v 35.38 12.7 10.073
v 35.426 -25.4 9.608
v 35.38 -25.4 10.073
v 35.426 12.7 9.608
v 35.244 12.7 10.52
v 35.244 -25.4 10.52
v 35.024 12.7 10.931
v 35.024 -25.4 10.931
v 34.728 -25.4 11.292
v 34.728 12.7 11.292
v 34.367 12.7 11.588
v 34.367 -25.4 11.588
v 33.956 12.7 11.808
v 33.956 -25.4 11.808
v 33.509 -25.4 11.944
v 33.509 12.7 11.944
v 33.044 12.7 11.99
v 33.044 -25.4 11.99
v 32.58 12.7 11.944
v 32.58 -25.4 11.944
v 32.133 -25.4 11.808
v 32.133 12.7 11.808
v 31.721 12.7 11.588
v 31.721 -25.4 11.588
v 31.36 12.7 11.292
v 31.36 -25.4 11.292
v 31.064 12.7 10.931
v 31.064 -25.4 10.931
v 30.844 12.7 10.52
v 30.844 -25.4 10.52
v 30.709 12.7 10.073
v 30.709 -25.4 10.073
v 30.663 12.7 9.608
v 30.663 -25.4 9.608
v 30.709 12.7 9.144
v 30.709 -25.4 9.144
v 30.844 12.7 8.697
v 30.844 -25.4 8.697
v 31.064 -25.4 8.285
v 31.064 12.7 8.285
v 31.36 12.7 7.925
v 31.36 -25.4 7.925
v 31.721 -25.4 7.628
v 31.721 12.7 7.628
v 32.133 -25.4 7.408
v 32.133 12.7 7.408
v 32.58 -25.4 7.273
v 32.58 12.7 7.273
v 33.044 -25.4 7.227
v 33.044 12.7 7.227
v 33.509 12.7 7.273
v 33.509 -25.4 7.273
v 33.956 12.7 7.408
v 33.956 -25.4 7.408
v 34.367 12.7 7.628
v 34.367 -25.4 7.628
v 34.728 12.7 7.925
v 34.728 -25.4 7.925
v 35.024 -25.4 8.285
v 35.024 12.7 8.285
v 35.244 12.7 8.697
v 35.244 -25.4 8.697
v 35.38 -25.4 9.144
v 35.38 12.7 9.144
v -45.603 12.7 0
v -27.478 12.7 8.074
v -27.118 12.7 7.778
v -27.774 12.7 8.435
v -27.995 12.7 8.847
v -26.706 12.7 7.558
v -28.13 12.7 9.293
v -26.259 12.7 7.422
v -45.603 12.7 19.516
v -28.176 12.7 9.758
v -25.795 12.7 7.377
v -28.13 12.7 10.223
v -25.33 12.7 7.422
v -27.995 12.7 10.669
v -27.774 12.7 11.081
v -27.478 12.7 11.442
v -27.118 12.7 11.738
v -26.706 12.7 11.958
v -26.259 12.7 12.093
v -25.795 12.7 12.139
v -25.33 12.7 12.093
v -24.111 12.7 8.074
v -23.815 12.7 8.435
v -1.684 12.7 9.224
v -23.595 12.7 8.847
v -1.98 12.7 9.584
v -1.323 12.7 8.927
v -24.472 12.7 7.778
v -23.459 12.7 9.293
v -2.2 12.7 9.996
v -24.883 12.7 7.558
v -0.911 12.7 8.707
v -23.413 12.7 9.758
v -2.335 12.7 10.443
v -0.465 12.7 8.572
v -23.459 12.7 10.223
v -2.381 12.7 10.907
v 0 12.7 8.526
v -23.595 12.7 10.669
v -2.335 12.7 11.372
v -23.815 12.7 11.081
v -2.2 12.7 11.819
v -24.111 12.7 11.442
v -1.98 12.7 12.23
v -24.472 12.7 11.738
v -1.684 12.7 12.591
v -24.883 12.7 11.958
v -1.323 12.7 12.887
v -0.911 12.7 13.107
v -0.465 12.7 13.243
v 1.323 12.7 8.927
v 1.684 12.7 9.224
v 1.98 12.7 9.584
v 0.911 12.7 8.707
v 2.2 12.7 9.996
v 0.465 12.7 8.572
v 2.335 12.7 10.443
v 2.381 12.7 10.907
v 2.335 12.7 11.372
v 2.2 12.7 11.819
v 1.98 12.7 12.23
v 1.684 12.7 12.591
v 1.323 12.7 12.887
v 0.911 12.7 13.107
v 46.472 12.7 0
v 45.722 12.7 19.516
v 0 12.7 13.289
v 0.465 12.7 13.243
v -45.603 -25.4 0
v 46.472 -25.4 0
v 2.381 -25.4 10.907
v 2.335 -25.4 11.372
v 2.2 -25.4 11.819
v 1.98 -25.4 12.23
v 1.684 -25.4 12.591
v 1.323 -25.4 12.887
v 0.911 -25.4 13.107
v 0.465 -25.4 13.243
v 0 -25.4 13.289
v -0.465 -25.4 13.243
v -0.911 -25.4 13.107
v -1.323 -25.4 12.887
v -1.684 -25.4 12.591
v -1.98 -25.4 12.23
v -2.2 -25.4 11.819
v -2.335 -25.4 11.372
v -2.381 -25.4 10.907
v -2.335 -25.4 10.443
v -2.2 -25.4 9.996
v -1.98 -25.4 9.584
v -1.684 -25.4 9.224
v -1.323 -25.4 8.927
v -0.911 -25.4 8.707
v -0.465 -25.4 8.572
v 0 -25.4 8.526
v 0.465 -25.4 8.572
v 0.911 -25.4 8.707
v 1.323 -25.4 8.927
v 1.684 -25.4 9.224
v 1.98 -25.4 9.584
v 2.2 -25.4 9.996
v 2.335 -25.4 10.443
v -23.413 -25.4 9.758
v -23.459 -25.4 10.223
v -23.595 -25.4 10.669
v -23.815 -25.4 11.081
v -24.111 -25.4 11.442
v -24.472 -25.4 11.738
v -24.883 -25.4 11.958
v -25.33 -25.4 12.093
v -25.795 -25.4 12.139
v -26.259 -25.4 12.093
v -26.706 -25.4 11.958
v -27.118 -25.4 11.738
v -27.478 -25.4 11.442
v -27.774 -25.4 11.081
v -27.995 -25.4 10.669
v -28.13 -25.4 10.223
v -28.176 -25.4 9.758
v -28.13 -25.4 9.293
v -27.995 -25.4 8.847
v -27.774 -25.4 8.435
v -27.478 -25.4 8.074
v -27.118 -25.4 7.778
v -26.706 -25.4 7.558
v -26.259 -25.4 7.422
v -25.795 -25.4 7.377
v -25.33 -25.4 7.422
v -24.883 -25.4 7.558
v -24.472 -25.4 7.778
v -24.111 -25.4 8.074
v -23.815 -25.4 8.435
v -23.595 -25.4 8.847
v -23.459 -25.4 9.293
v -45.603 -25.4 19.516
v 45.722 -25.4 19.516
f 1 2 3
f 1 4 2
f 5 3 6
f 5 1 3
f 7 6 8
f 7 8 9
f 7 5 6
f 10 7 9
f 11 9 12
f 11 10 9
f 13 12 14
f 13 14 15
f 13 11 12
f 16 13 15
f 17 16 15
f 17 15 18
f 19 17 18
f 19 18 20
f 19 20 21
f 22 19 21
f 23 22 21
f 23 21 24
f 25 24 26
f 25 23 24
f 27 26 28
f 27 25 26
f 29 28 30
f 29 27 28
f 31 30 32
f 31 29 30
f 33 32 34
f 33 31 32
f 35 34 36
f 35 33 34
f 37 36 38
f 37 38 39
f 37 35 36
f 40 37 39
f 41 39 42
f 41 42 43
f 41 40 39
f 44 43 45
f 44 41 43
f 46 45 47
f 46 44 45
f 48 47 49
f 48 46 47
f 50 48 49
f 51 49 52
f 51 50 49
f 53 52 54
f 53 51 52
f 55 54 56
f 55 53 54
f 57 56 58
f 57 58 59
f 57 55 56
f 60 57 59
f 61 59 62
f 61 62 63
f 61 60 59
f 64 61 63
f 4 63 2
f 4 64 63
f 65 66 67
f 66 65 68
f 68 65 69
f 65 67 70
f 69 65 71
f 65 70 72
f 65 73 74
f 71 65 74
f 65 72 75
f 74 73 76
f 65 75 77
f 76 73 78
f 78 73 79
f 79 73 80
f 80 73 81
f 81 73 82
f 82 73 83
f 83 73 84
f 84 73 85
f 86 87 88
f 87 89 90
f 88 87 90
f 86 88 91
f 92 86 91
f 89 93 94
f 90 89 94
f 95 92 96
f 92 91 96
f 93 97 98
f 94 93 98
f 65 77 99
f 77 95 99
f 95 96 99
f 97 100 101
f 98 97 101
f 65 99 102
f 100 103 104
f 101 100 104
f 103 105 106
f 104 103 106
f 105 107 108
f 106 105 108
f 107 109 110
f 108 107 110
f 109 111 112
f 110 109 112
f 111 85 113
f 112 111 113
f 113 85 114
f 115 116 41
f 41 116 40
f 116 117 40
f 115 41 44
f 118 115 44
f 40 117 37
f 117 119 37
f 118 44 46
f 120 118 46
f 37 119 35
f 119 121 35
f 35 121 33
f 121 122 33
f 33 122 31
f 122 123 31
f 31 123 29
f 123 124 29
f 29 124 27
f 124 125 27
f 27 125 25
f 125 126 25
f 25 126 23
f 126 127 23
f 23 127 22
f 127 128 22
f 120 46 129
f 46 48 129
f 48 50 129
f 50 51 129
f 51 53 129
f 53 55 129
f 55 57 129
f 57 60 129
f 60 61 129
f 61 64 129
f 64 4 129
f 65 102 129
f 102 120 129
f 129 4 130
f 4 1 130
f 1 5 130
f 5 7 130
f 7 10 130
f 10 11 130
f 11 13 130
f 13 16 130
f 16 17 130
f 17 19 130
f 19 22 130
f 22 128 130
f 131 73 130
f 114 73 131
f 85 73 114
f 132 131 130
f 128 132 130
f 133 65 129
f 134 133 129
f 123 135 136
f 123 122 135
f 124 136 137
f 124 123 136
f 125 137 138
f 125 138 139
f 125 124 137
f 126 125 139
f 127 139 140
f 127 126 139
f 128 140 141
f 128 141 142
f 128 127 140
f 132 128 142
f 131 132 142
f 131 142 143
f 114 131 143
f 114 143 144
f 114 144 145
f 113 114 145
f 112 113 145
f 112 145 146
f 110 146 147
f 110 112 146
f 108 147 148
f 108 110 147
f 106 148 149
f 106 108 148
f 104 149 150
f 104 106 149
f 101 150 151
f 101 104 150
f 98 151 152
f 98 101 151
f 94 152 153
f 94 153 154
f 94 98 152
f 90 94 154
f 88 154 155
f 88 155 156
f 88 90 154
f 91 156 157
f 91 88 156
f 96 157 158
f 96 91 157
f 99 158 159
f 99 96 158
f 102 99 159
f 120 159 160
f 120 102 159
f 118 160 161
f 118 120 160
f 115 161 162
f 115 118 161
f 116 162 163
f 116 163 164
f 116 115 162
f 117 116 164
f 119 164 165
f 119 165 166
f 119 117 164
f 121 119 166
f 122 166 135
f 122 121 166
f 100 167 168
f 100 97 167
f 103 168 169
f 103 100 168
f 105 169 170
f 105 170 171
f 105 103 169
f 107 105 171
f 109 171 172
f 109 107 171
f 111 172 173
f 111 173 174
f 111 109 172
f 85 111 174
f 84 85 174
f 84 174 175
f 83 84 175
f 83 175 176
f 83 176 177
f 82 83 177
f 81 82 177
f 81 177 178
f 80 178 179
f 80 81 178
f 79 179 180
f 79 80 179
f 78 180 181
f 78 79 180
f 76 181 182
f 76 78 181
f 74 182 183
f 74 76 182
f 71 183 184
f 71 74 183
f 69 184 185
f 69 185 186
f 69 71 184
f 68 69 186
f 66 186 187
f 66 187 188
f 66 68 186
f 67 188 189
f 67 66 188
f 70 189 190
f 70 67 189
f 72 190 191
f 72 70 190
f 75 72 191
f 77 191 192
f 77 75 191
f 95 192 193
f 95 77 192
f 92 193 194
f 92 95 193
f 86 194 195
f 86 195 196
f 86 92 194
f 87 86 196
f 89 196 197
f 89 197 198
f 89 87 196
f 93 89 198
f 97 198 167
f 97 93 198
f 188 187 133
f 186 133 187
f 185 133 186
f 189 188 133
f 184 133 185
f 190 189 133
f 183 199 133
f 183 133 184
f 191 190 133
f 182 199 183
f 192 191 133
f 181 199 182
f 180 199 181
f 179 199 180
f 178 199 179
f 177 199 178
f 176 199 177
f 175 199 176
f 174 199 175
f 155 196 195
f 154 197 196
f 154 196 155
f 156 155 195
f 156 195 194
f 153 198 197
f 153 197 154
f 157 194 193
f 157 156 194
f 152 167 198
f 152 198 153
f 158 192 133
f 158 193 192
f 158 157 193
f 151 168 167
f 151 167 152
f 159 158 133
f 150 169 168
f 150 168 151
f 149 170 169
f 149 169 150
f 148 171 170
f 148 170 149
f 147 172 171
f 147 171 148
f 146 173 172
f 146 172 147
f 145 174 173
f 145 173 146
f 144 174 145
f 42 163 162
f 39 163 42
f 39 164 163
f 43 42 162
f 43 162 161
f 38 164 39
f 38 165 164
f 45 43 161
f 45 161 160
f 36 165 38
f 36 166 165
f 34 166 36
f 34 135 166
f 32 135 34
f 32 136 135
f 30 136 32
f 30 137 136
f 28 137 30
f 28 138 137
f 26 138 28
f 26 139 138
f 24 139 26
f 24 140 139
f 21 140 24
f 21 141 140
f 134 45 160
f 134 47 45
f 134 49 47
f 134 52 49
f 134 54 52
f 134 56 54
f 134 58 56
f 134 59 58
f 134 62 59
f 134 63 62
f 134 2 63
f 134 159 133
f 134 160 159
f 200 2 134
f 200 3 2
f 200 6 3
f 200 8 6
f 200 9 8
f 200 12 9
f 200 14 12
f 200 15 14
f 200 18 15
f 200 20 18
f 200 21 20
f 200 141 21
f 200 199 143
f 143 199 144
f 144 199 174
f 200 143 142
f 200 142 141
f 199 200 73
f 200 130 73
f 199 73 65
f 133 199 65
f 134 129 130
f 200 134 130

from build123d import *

# Parameters (mm, degrees)
F0_R     = 2.38125
F1_DEPTH = 12.7
F2_DEPTH = 25.4
F3_DEPTH = 25.4
F4_DEPTH = 25.4


# Not quite as in the source:
# - a feature names something its author has since deleted; it is built from what else it names


with BuildPart() as f1:
    # F0 (on Front) → F1 (new body, symmetric)
    with BuildSketch(Plane.XZ):
        Polygon((-45.6028679988, 0), (46.4721320012, 0), (45.7215224688, 19.5158975394), (-45.6028679988, 19.5158975394), align=None)
        with Locations((33.0442860723, 9.6084093675)):
            Circle(F0_R, mode=Mode.SUBTRACT)
        with Locations((-25.7945582271, 9.7579487697)):
            Circle(F0_R, mode=Mode.SUBTRACT)
        with Locations((0, 10.9073175117)):
            Circle(F0_R, mode=Mode.SUBTRACT)
    extrude(amount=F1_DEPTH, both=True)

    # F0 (on Front) → F2 (join)
    with BuildSketch(Plane.XZ):
        Polygon((-45.6028679988, 0), (46.4721320012, 0), (45.7215224688, 19.5158975394), (-45.6028679988, 19.5158975394), align=None)
        with Locations((33.0442860723, 9.6084093675)):
            Circle(F0_R, mode=Mode.SUBTRACT)
        with Locations((-25.7945582271, 9.7579487697)):
            Circle(F0_R, mode=Mode.SUBTRACT)
        with Locations((0, 10.9073175117)):
            Circle(F0_R, mode=Mode.SUBTRACT)
    extrude(amount=F2_DEPTH)

    # F0 (on Front) → F3 (join)
    with BuildSketch(Plane.XZ):
        Polygon((-45.6028679988, 0), (46.4721320012, 0), (45.7215224688, 19.5158975394), (-45.6028679988, 19.5158975394), align=None)
        with Locations((33.0442860723, 9.6084093675)):
            Circle(F0_R, mode=Mode.SUBTRACT)
        with Locations((-25.7945582271, 9.7579487697)):
            Circle(F0_R, mode=Mode.SUBTRACT)
        with Locations((0, 10.9073175117)):
            Circle(F0_R, mode=Mode.SUBTRACT)
    extrude(amount=F3_DEPTH)

    # F0 (on Front) → F4 (join)
    with BuildSketch(Plane.XZ):
        Polygon((-45.6028679988, 0), (46.4721320012, 0), (45.7215224688, 19.5158975394), (-45.6028679988, 19.5158975394), align=None)
        with Locations((33.0442860723, 9.6084093675)):
            Circle(F0_R, mode=Mode.SUBTRACT)
        with Locations((-25.7945582271, 9.7579487697)):
            Circle(F0_R, mode=Mode.SUBTRACT)
        with Locations((0, 10.9073175117)):
            Circle(F0_R, mode=Mode.SUBTRACT)
    extrude(amount=F4_DEPTH)


solid = f1.part
